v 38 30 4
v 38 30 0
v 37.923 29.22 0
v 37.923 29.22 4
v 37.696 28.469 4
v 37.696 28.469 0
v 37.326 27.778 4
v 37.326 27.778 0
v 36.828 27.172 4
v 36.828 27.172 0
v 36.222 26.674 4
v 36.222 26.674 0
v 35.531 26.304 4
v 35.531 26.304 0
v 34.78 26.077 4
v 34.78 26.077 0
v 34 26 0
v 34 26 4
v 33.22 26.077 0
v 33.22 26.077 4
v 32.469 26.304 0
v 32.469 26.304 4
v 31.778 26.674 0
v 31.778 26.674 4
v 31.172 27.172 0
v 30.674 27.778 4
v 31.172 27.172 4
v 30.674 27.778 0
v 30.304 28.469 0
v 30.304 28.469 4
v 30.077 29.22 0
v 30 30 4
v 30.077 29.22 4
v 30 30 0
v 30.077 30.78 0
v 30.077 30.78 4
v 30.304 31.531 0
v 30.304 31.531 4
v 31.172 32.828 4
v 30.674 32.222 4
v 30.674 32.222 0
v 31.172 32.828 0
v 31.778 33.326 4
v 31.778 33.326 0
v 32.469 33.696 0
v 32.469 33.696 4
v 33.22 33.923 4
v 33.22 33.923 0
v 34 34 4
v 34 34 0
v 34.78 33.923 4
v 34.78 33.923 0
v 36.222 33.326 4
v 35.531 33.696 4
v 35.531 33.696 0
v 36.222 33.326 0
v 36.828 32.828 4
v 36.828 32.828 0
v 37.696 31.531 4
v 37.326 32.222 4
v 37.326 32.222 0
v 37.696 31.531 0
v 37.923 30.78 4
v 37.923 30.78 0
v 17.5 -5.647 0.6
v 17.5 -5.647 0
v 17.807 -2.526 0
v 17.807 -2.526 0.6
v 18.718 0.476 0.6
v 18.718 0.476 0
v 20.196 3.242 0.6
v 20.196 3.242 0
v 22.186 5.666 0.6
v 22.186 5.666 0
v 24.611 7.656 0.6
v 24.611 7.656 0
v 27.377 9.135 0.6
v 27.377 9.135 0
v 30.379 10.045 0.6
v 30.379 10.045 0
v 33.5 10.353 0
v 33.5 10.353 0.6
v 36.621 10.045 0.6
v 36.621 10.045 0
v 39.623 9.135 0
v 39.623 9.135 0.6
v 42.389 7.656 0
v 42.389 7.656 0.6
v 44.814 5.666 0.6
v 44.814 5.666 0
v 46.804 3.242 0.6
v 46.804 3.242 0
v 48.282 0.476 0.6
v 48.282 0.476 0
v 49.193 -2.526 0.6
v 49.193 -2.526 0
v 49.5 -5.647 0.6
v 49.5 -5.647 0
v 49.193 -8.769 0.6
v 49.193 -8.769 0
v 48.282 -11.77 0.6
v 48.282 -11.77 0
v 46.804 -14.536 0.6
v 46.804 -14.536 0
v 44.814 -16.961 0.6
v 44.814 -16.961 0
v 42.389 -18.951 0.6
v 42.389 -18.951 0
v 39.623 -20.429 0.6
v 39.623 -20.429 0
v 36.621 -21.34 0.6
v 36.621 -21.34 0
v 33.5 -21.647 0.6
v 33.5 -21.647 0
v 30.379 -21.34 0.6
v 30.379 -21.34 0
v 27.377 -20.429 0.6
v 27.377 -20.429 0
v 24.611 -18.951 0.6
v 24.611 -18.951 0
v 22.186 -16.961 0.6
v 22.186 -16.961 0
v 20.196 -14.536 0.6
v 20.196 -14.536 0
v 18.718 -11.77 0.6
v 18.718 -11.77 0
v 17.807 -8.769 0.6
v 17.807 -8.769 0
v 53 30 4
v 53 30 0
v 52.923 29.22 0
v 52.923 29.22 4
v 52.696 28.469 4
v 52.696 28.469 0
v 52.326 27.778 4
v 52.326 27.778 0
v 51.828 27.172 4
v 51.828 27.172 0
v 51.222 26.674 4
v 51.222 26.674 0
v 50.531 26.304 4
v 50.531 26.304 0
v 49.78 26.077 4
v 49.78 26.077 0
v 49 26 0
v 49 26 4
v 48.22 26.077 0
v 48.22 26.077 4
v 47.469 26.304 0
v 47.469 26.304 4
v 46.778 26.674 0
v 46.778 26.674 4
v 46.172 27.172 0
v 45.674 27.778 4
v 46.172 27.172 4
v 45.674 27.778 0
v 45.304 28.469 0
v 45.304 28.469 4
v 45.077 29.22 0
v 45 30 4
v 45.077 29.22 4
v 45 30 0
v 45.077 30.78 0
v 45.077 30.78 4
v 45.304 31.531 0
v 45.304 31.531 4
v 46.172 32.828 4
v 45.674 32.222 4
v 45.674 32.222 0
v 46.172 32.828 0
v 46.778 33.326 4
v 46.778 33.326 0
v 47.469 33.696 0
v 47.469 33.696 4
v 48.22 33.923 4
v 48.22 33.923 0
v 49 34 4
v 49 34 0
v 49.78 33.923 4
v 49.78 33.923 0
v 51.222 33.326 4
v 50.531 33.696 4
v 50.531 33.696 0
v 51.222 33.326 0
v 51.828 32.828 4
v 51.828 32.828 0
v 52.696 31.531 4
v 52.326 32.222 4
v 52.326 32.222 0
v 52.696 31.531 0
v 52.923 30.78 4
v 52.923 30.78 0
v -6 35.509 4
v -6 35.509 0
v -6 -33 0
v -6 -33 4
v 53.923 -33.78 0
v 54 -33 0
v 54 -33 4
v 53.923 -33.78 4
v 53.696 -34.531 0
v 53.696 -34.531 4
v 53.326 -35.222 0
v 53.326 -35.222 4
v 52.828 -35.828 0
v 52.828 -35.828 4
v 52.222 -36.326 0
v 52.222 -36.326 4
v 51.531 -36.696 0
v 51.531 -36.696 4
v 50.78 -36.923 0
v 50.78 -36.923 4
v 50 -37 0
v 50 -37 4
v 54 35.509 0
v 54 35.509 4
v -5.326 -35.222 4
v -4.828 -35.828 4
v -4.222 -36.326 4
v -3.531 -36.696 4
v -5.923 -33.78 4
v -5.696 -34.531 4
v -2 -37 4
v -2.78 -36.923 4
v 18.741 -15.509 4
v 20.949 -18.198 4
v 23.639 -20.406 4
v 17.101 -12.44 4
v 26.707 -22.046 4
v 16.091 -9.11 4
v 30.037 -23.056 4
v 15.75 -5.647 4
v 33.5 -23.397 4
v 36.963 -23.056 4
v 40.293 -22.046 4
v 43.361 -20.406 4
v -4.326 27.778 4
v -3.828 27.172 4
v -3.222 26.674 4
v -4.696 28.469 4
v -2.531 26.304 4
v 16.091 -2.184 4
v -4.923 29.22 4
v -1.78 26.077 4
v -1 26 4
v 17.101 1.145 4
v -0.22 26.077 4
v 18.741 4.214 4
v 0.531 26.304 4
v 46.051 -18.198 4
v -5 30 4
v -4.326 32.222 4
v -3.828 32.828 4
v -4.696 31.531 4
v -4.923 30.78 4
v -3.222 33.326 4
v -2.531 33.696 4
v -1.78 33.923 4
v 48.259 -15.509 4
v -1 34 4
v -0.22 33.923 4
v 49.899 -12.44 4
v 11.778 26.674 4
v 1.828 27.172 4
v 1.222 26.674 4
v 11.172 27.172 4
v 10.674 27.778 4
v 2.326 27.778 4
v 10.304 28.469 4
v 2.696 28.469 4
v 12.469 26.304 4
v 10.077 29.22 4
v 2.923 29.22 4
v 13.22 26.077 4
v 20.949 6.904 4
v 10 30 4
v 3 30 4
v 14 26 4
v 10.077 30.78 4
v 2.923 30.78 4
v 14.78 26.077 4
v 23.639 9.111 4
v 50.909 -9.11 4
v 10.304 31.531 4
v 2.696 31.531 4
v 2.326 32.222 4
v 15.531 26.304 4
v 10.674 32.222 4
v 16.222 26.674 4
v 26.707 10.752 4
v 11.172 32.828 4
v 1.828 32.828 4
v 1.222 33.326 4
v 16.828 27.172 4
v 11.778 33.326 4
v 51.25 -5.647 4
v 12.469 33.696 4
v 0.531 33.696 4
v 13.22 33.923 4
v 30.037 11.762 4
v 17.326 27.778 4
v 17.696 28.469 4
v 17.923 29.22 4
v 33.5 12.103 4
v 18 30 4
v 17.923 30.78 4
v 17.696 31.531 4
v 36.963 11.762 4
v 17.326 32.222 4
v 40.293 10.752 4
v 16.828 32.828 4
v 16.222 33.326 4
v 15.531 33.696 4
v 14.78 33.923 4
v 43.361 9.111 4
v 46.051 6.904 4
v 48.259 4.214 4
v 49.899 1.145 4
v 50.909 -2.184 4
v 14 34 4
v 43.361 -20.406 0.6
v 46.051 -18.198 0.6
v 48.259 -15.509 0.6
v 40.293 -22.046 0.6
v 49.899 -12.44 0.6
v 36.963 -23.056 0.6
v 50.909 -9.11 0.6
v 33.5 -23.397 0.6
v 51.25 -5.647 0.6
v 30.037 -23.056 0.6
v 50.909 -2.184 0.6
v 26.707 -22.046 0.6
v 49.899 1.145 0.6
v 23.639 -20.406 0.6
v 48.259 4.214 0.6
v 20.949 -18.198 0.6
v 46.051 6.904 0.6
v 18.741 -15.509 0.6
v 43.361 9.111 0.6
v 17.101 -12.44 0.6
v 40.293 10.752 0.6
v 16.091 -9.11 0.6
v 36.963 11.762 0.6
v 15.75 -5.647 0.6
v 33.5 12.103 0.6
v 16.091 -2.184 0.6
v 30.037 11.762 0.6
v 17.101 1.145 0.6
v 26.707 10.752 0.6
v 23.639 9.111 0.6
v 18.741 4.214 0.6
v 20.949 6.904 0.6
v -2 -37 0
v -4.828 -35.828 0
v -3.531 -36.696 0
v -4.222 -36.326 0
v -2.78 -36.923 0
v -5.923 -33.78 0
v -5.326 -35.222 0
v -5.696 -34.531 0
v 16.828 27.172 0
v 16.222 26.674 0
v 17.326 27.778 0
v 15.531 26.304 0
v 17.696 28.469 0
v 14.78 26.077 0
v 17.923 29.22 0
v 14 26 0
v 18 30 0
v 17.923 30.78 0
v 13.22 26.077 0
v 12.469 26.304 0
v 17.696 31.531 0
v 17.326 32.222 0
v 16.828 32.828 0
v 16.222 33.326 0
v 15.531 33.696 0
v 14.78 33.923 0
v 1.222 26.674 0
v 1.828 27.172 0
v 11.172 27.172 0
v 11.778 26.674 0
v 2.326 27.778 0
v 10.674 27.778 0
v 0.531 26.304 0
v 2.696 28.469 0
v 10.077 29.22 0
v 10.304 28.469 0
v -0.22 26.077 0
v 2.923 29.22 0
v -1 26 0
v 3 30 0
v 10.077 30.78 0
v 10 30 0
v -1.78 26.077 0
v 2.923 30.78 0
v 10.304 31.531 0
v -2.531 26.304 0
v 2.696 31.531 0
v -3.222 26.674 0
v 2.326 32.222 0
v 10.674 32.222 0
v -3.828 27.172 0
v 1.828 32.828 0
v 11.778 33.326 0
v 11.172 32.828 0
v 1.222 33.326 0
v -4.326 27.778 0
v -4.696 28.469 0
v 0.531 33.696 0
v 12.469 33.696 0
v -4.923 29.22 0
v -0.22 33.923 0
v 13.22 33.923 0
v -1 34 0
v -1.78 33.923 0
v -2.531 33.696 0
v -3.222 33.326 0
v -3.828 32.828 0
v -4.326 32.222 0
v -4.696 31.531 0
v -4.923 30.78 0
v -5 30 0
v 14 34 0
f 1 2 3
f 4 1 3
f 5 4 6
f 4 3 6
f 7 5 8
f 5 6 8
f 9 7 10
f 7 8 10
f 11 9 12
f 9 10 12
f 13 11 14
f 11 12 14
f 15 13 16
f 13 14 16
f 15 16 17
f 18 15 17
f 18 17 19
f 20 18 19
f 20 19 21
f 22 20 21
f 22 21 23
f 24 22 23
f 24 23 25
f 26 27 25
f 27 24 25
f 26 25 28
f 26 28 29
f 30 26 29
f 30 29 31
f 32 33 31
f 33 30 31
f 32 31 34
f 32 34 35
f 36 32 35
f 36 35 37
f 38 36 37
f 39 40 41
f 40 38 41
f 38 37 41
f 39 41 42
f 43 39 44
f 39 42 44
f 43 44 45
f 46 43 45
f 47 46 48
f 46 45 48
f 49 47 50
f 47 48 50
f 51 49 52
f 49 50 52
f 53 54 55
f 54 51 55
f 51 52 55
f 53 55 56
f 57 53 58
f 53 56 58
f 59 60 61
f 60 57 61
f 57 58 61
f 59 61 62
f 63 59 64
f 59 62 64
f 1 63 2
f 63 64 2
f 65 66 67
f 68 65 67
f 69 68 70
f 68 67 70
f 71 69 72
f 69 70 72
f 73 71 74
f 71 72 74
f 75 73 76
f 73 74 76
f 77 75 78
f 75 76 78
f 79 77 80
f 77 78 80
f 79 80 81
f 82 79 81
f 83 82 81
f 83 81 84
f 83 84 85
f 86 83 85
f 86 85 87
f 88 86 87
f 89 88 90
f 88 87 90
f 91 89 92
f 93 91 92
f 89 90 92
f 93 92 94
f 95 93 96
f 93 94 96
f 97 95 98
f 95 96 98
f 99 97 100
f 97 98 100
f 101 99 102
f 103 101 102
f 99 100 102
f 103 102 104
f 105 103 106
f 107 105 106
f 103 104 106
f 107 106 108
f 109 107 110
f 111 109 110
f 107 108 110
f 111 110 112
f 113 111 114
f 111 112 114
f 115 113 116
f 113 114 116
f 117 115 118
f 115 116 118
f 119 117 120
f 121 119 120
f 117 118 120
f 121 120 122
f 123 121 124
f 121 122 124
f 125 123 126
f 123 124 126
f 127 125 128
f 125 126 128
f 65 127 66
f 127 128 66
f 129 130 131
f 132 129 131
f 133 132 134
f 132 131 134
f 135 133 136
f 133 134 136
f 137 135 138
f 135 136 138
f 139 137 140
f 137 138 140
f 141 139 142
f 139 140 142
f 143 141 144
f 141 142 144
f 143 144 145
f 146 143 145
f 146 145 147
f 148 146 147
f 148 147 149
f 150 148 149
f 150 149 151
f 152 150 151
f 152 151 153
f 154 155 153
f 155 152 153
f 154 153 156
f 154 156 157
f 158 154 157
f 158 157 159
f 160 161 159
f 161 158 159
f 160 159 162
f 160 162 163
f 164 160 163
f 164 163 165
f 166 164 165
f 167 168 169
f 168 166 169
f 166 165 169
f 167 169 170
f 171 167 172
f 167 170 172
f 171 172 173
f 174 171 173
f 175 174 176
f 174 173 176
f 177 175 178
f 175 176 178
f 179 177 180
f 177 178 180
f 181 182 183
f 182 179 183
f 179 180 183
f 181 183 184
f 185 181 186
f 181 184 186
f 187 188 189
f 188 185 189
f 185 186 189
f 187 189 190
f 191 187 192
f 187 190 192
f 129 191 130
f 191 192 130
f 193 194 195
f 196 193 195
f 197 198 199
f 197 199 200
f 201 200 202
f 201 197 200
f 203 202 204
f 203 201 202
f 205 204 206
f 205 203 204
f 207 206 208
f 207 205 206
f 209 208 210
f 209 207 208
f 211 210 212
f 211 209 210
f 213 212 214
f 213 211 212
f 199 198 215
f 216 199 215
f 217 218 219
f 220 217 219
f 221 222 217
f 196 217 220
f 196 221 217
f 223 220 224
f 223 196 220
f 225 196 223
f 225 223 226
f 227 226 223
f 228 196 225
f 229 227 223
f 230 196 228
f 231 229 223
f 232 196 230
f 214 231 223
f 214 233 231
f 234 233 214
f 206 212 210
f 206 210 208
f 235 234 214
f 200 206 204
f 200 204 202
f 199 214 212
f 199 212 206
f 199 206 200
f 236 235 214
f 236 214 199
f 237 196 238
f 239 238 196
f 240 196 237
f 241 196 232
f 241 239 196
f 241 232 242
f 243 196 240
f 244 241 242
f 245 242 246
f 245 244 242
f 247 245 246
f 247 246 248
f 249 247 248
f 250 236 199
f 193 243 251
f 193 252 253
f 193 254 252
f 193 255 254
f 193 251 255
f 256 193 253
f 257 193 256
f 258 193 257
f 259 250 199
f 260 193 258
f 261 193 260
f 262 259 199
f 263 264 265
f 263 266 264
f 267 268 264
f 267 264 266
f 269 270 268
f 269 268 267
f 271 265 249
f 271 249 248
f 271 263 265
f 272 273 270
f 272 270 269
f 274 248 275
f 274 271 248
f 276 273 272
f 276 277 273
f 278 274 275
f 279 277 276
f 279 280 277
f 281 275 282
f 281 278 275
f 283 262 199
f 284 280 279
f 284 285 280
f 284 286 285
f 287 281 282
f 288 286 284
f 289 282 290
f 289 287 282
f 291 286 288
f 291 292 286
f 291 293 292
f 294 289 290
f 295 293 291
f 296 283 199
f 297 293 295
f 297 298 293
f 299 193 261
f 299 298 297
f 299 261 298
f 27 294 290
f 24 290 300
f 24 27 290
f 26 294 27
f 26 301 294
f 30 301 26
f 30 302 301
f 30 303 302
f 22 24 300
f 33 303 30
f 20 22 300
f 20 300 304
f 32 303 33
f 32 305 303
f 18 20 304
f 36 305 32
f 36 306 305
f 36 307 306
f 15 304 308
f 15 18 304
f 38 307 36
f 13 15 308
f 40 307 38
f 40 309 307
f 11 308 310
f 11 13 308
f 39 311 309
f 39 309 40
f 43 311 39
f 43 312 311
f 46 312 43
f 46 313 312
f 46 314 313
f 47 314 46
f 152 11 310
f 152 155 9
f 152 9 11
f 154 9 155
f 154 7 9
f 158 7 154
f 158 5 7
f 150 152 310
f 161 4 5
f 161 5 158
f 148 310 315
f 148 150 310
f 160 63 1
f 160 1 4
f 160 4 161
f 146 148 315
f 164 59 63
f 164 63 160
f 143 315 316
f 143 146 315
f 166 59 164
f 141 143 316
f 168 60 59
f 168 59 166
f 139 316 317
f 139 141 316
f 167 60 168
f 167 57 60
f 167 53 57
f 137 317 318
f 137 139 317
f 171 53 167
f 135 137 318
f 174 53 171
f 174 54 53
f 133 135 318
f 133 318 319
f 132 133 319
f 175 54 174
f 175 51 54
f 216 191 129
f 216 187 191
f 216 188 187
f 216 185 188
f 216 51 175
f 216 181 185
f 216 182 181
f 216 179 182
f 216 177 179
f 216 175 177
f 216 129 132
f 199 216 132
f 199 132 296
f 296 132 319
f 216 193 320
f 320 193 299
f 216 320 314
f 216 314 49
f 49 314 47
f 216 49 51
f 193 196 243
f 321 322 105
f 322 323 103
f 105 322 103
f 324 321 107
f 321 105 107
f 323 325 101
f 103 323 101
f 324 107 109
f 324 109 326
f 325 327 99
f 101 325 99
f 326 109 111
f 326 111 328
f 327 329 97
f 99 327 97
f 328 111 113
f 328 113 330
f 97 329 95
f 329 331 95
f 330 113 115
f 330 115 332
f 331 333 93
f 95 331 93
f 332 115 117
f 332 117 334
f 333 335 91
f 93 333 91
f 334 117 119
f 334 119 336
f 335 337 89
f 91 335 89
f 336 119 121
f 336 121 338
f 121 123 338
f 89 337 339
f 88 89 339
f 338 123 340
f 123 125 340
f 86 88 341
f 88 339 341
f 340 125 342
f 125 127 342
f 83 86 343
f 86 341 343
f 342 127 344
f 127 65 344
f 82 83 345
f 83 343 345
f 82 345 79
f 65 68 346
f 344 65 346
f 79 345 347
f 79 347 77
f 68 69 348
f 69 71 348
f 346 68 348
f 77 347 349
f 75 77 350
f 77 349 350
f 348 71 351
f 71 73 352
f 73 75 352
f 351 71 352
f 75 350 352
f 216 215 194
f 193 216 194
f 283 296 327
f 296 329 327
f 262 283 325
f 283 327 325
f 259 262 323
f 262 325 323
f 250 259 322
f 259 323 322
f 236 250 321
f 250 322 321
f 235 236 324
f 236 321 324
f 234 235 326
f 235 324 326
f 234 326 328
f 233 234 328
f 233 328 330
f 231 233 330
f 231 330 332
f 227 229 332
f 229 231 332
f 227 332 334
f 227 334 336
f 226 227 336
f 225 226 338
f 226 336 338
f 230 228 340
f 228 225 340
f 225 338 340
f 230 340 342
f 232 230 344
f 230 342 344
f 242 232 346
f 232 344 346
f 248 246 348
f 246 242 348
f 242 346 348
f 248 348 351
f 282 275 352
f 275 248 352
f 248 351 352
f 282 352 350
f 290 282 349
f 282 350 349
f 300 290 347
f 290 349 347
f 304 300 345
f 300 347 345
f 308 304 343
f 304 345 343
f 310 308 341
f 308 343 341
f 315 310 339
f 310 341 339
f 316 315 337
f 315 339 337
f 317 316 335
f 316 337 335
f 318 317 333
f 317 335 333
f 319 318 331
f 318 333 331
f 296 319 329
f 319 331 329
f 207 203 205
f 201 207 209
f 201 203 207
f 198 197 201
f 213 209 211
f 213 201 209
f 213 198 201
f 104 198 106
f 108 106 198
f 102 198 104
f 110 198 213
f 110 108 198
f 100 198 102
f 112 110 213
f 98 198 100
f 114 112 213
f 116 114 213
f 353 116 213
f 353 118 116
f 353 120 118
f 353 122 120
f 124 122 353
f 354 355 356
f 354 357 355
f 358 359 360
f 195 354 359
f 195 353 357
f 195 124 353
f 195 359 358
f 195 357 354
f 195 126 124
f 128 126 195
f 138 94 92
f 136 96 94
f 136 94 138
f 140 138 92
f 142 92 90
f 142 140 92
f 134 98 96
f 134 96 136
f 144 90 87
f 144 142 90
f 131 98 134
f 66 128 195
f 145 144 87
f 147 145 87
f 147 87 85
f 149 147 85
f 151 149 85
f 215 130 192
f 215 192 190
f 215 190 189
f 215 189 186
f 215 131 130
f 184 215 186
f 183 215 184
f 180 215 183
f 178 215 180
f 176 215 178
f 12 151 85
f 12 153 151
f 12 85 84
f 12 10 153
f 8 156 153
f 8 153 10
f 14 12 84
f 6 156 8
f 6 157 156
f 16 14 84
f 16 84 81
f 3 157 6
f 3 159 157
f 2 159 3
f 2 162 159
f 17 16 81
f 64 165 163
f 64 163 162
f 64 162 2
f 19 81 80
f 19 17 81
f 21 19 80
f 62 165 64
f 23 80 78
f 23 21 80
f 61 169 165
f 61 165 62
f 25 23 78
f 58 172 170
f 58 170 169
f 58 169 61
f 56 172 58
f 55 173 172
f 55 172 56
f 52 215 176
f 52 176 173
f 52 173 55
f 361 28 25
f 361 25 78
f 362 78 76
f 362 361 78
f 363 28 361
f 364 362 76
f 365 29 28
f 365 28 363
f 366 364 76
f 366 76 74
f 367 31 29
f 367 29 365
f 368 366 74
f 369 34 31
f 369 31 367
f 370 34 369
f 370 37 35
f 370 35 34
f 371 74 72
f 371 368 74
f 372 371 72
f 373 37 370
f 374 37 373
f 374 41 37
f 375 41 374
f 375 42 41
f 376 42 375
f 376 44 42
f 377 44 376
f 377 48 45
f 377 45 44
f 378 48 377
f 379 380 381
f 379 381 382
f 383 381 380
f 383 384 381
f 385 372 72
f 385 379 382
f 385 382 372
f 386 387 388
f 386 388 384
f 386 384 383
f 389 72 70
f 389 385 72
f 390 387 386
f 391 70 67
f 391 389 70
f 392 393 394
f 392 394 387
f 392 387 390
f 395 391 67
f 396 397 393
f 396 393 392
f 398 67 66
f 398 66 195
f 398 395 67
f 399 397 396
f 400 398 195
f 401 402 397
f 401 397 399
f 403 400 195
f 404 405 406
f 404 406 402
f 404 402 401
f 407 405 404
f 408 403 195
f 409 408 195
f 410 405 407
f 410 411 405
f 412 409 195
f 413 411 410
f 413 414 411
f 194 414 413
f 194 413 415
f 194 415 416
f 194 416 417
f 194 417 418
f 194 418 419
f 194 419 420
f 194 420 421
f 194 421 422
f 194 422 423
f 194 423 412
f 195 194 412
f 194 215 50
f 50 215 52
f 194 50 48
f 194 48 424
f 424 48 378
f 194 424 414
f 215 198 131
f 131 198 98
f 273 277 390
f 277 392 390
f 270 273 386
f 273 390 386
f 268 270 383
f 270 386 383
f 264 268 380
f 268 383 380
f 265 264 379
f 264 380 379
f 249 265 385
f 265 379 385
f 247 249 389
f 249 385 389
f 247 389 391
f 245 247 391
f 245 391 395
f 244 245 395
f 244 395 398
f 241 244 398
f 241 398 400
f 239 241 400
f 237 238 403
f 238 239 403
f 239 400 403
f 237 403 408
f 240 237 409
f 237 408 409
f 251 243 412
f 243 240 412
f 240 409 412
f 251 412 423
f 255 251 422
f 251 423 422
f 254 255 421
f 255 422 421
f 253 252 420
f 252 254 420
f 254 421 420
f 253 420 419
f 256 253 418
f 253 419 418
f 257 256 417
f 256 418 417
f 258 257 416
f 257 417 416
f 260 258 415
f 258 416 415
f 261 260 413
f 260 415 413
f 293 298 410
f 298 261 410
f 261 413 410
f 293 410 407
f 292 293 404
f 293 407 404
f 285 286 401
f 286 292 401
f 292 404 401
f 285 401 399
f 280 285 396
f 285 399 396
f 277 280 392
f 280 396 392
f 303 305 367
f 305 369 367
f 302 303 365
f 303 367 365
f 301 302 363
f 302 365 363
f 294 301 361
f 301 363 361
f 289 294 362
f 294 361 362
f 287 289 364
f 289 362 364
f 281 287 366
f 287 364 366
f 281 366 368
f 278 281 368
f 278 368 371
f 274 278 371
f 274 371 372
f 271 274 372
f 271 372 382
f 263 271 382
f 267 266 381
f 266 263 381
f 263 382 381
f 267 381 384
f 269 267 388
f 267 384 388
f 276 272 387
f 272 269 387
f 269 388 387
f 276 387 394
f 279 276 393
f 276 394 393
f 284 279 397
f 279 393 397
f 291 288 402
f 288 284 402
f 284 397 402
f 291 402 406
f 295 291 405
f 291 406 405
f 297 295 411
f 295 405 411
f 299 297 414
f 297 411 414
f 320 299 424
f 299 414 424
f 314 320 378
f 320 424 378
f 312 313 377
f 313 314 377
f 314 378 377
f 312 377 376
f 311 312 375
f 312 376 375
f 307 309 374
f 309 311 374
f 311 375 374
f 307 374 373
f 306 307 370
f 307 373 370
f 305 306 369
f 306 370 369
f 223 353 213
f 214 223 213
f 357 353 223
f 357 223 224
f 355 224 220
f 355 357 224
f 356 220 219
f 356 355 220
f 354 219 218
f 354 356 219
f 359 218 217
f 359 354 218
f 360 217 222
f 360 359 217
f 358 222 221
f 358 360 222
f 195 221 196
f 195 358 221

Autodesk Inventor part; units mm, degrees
ref_plane "YZ Plane" through (0, 0, 0) normal (1, 0, 0) x (0, 1, 0)
ref_plane "XZ Plane" through (0, 0, 0) normal (0, 1, 0) x (-1, 0, 0)
ref_plane "XY Plane" through (0, 0, 0) normal (0, 0, 1) x (1, 0, 0)
ref_plane "Work Plane1" through (0, 0, 0) normal (0, 0, 1) x (1, 0, 0)
ref_plane "Work Plane2" through (0, 0, 0) normal (0, 0, 1) x (1, 0, 0)
sketch "Sketch2" plane through (0, 0, 0) normal (0, 0, 1) x (1, 0, 0)
  circle A0 centre (24, 55) radius 16 projected
  circle A1 centre (49, 30) radius 4 projected
  circle A2 centre (-1, 80) radius 4 projected
  circle A3 centre (34, 30) radius 4 projected
  circle A4 centre (49, 65) radius 4 projected
  circle A5 centre (14, 80) radius 4 projected
  circle A6 centre (-1, 45) radius 4 projected
  circle A7 centre (-1, 65) radius 4 projected
  circle A8 centre (34, 80) radius 4 projected
  circle A9 centre (49, 45) radius 4 projected
  circle A10 centre (14, 30) radius 4 projected
  circle A11 centre (-1, 30) radius 4 projected
  circle A12 centre (49, 80) radius 4 projected
  arc A13 (54, -29) -> (50, -25) centre (50, -29) ccw projected
  line L0 (50, -25) -> (10, -25) projected
  arc A14 (6, -21) -> (10, -25) centre (10, -21) ccw projected
  line L1 (6, -21) -> (6, 21) projected
  arc A15 (10, 25) -> (6, 21) centre (10, 21) ccw projected
  line L2 (10, 25) -> (52, 25) projected
  line L3 (52, 25) -> (54, 27) projected
  line L4 (54, 27) -> (54, 83) projected
  line L5 (54, 83) -> (52, 85) projected
  line L6 (52, 85) -> (-4, 85) projected
  line L7 (-4, 85) -> (-6, 83) projected
  line L8 (-6, 83) -> (-6, -33) projected
  arc A16 (-6, -33) -> (-2, -37) centre (-2, -33) ccw projected
  line L9 (-2, -37) -> (50, -37) projected
  arc A17 (50, -37) -> (54, -33) centre (50, -33) ccw projected
  line L10 (54, -33) -> (54, -29) projected
  line L11 (54, 35.5093) -> (-6, 35.5093)
  line L12 (54, 27) -> (54, -29)
  circle A18 centre (33.5, 2.5) radius 17.5 construction
  circle A19 centre (33.5, -5.6473) radius 17.75
  point P0 (0, 0)
  dimension "d11" = 35.5
extrude "Extrusion2" add sketch "Sketch2" along normal blind 4 contours L10 A17 L9 A16 L8 L11 L4 L3 L2 A15 L1 A14 L0 A13 | A13 L0 A14 L1 A15 L2 L3 L12
sketch "Sketch3" plane through (0, 0, 0) normal (0, 0, -1) x (-1, 0, 0)
  circle A0 centre (-33.5, -5.6473) radius 17.75 projected
  circle A1 centre (-33.5, -5.6473) radius 16
  point P0 (0, 0)
  point P1 (-33.5, 2.5)
  dimension "d12" = 32
extrude "Extrusion3" add sketch "Sketch3" against normal blind 0.6
properties part number "30_XY_Sample_arm_35mmadapter"
